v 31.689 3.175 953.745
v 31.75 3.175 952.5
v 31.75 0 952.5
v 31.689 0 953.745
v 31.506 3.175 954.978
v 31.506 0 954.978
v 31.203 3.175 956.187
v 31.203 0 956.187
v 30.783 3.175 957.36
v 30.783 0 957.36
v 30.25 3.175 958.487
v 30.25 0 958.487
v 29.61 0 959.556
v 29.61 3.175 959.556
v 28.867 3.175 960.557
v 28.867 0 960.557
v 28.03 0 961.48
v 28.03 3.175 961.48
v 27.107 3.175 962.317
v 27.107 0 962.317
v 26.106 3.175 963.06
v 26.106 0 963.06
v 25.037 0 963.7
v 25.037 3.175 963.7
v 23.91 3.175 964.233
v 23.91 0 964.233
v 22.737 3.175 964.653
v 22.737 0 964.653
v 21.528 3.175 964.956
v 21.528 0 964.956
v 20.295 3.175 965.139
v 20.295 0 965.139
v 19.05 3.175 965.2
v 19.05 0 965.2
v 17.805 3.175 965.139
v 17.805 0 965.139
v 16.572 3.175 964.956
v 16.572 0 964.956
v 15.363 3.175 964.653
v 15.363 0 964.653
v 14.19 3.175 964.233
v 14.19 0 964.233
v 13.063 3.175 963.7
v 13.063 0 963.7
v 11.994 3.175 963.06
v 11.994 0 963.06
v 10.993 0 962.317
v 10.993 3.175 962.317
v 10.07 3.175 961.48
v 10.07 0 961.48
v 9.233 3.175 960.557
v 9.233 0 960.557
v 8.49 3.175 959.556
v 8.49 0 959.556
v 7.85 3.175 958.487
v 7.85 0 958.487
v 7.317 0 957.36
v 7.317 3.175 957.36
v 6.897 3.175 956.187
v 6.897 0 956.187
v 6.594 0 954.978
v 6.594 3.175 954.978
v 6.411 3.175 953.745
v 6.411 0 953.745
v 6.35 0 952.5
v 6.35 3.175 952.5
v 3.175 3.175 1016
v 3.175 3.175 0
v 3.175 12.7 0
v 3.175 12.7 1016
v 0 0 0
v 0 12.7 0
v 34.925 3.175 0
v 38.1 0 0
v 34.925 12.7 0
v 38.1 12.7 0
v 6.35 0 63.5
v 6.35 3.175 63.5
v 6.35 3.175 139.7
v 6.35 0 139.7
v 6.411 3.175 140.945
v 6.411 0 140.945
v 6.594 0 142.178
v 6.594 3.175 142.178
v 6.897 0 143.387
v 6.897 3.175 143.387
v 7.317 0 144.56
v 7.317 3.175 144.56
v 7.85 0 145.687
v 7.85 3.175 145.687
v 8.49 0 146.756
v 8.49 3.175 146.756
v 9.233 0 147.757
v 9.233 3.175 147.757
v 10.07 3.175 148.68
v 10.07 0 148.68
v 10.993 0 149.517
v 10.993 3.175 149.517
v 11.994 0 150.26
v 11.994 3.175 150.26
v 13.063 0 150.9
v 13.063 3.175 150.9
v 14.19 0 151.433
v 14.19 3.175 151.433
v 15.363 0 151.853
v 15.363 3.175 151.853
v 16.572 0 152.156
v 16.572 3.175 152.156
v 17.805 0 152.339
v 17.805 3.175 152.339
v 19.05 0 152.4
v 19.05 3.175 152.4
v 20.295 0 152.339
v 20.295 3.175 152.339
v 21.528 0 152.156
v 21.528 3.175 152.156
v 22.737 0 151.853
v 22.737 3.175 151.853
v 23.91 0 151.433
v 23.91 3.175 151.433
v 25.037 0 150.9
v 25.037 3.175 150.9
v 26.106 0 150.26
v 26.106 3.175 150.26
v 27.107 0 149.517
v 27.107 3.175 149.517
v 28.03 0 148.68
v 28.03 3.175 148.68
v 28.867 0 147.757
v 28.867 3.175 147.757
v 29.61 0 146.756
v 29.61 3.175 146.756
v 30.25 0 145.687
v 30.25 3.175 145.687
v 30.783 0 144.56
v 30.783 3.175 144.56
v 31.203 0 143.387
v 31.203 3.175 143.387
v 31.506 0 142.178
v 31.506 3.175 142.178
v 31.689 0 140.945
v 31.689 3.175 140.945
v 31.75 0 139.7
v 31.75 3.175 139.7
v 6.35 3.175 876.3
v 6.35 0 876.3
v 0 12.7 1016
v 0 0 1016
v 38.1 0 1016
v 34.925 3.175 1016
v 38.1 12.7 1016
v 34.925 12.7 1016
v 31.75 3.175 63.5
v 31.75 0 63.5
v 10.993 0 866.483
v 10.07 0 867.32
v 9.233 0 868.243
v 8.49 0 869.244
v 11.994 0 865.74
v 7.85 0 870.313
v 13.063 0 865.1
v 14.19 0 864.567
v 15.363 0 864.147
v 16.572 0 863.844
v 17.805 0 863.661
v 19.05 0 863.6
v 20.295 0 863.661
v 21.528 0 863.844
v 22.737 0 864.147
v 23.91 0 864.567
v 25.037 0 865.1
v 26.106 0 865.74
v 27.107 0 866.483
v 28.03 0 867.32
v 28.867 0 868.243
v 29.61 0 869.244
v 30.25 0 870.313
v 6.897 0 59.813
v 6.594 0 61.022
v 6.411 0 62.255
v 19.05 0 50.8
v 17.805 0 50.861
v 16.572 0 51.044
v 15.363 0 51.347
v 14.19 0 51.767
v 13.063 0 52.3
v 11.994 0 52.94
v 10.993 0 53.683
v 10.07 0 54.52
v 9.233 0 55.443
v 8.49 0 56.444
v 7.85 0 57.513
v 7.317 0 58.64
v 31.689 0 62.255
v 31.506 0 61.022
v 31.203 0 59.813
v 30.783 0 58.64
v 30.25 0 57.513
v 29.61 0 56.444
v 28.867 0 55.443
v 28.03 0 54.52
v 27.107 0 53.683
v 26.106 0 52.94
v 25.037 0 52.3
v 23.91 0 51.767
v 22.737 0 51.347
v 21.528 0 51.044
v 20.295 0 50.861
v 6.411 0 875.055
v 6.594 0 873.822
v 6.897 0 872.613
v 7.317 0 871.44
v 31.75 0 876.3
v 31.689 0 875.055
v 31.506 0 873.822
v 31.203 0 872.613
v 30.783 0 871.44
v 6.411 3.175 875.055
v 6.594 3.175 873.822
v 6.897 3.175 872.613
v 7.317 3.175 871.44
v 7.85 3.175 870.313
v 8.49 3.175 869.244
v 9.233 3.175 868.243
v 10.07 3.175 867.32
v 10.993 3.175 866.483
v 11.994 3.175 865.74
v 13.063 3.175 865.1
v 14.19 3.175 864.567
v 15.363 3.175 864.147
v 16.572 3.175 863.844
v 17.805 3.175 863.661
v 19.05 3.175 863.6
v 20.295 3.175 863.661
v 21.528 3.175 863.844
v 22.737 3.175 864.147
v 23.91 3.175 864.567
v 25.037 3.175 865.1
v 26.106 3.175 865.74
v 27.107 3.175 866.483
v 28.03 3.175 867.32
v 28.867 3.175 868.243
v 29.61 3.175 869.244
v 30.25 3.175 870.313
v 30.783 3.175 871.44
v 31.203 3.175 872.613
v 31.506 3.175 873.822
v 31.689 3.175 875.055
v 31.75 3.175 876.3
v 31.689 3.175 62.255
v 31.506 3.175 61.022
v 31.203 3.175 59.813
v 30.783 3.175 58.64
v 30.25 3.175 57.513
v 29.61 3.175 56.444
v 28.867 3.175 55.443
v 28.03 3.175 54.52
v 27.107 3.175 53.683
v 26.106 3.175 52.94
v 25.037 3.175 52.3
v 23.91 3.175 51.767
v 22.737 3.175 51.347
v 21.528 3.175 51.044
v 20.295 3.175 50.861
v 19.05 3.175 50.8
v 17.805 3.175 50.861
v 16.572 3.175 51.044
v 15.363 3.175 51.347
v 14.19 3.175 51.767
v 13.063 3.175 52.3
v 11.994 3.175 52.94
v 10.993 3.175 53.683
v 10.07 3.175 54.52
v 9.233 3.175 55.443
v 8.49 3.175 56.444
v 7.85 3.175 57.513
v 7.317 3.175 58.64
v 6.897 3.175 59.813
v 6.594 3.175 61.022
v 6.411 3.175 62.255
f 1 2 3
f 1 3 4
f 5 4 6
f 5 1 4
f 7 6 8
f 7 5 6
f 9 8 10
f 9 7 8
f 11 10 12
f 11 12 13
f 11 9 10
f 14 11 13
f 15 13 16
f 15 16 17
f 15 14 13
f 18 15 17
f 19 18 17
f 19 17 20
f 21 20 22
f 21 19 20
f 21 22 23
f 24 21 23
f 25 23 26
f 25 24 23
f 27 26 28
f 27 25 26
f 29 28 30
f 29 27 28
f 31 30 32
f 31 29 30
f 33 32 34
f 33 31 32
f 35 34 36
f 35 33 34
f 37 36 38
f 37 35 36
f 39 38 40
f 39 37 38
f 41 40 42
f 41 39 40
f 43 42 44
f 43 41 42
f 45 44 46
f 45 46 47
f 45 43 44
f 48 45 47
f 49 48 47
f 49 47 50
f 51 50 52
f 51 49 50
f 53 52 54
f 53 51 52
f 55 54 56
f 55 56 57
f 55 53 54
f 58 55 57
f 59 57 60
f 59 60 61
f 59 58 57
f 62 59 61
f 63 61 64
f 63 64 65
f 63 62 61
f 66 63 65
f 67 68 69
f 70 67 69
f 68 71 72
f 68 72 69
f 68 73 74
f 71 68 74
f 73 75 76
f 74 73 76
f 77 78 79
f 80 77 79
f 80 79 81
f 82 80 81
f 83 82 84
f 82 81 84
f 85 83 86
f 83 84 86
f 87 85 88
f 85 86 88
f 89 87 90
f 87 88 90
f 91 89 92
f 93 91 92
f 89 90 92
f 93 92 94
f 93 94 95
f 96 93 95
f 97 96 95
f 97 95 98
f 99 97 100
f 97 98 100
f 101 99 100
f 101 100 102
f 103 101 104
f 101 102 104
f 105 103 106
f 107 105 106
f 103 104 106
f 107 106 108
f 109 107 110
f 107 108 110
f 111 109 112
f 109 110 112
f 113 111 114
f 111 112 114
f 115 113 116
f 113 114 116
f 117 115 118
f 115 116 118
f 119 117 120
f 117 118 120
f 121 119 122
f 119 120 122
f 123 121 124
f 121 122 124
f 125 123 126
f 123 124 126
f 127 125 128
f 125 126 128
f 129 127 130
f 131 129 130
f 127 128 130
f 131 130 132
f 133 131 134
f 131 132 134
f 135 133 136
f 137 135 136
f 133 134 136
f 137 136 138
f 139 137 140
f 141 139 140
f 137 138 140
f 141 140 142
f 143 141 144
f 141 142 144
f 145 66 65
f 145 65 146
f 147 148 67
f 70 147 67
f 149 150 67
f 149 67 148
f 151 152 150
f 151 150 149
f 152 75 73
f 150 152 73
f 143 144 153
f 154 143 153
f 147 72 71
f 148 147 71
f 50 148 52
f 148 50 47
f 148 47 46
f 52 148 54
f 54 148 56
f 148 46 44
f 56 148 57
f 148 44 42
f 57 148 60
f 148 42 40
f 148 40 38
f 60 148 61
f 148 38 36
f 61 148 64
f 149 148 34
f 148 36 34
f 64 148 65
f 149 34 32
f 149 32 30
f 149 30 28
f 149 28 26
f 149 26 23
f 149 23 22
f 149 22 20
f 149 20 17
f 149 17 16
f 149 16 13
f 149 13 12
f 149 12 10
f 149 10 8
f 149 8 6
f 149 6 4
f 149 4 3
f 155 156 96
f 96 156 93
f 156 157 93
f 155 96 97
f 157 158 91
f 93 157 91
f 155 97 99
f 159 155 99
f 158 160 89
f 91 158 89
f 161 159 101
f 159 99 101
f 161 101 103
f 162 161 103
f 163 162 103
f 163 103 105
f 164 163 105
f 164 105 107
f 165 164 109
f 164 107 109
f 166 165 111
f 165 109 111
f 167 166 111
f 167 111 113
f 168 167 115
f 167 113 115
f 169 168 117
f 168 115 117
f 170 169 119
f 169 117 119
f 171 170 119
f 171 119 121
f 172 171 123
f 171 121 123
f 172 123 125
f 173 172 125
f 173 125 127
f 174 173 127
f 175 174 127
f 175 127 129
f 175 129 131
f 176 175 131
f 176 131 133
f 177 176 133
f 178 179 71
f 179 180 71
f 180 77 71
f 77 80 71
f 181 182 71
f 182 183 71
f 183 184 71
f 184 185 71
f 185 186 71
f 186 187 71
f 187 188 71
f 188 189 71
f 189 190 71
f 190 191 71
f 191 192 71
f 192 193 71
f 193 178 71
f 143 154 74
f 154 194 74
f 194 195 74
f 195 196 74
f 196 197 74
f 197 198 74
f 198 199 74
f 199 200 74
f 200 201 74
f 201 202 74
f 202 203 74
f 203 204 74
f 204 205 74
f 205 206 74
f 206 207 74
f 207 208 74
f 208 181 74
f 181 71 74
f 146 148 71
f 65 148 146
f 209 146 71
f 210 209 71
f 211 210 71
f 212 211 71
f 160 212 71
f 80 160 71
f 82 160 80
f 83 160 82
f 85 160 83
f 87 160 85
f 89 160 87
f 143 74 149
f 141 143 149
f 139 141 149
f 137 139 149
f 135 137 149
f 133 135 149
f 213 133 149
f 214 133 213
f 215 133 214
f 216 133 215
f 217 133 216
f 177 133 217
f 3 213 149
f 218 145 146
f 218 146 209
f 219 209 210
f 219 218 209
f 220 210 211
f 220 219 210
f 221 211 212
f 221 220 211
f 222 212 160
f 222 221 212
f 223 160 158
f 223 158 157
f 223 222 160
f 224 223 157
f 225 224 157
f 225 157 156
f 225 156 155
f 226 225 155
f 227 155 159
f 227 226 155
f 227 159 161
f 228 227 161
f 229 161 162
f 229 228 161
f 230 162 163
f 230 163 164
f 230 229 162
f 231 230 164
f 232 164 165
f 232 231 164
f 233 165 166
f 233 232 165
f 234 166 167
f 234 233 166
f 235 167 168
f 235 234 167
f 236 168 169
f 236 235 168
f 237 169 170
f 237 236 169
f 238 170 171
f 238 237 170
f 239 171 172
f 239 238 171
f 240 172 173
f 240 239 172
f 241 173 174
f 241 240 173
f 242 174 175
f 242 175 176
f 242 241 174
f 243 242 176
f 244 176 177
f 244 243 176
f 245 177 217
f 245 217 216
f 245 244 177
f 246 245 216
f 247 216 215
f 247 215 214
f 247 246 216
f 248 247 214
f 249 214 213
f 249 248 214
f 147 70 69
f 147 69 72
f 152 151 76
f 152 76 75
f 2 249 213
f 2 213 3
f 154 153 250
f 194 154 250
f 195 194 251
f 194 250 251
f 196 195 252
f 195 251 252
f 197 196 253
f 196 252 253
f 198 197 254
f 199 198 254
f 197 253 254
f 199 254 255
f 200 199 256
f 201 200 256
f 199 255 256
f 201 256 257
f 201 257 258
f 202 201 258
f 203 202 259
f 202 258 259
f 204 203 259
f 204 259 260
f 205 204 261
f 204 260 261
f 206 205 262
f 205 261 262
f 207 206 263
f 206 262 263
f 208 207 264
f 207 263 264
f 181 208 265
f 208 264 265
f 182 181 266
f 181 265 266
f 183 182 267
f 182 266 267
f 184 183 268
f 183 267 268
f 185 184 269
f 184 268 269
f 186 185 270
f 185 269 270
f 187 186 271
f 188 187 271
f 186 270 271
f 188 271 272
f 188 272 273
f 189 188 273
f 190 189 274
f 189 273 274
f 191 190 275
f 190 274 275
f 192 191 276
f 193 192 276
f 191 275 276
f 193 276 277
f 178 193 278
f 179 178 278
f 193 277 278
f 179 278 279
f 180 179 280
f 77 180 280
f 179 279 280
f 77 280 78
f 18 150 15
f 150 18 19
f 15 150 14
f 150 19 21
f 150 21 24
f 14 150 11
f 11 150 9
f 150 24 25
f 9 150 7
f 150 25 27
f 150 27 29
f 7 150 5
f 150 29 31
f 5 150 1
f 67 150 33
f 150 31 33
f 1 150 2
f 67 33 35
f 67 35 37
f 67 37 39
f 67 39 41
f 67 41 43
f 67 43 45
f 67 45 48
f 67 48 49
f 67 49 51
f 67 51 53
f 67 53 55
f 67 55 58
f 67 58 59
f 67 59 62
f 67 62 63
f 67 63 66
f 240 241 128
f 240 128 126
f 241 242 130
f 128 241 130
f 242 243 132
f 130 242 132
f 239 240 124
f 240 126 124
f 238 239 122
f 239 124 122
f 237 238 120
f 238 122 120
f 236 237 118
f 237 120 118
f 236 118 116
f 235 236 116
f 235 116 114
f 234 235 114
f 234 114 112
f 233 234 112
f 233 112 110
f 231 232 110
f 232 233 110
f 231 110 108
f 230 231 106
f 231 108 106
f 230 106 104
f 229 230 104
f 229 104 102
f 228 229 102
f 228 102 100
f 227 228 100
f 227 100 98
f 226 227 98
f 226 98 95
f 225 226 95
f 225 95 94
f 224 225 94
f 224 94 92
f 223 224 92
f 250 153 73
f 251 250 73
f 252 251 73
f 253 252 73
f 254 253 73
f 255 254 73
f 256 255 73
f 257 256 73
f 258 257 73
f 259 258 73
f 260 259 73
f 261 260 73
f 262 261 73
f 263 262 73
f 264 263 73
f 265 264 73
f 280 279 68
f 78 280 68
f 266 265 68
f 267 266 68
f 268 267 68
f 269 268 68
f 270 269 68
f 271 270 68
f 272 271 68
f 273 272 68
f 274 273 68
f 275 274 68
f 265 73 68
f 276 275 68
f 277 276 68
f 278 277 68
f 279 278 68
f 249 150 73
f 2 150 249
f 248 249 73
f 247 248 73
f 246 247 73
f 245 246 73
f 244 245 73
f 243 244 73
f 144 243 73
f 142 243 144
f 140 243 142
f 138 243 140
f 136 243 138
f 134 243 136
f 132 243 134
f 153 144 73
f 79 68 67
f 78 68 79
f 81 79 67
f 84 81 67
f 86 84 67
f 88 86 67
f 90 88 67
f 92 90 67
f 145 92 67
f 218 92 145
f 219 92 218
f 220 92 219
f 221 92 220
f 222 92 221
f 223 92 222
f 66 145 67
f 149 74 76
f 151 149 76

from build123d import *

# Parameters (mm, degrees)
EXTRUDE_F_DEPTH    = 1016
CUT_EXTRUDE1_DEPTH = 3.175


with BuildPart() as part:
    # Sketch1 → Extrude f (new body)
    with BuildSketch(Plane.XY):
        Polygon((3.175, 3.175), (3.175, 12.7), (0, 12.7), (0, 0), (38.1, 0), (38.1, 12.7), (34.925, 12.7), (34.925, 3.175), align=None)
    extrude(amount=EXTRUDE_F_DEPTH)

    # Sketch2 → Cut-Extrude1 (cut)
    with BuildSketch(Plane(origin=(0, 3.175, 0), x_dir=(1, 0, 0), z_dir=(0, 1, 0))):
        with BuildLine():
            Line((6.35, -952.5), (6.35, -876.3))
            ThreePointArc((6.35, -876.3), (19.05, -863.6), (31.75, -876.3))
            Line((31.75, -876.3), (31.75, -952.5))
            ThreePointArc((31.75, -952.5), (19.05, -965.2), (6.35, -952.5))
        make_face()
    cut_extrude1 = extrude(amount=-CUT_EXTRUDE1_DEPTH, mode=Mode.SUBTRACT)

    # Mirror1: Cut-Extrude1 across plane
    add(cut_extrude1.mirror(Plane.XY.offset(508)), mode=Mode.SUBTRACT)


solid = part.part
